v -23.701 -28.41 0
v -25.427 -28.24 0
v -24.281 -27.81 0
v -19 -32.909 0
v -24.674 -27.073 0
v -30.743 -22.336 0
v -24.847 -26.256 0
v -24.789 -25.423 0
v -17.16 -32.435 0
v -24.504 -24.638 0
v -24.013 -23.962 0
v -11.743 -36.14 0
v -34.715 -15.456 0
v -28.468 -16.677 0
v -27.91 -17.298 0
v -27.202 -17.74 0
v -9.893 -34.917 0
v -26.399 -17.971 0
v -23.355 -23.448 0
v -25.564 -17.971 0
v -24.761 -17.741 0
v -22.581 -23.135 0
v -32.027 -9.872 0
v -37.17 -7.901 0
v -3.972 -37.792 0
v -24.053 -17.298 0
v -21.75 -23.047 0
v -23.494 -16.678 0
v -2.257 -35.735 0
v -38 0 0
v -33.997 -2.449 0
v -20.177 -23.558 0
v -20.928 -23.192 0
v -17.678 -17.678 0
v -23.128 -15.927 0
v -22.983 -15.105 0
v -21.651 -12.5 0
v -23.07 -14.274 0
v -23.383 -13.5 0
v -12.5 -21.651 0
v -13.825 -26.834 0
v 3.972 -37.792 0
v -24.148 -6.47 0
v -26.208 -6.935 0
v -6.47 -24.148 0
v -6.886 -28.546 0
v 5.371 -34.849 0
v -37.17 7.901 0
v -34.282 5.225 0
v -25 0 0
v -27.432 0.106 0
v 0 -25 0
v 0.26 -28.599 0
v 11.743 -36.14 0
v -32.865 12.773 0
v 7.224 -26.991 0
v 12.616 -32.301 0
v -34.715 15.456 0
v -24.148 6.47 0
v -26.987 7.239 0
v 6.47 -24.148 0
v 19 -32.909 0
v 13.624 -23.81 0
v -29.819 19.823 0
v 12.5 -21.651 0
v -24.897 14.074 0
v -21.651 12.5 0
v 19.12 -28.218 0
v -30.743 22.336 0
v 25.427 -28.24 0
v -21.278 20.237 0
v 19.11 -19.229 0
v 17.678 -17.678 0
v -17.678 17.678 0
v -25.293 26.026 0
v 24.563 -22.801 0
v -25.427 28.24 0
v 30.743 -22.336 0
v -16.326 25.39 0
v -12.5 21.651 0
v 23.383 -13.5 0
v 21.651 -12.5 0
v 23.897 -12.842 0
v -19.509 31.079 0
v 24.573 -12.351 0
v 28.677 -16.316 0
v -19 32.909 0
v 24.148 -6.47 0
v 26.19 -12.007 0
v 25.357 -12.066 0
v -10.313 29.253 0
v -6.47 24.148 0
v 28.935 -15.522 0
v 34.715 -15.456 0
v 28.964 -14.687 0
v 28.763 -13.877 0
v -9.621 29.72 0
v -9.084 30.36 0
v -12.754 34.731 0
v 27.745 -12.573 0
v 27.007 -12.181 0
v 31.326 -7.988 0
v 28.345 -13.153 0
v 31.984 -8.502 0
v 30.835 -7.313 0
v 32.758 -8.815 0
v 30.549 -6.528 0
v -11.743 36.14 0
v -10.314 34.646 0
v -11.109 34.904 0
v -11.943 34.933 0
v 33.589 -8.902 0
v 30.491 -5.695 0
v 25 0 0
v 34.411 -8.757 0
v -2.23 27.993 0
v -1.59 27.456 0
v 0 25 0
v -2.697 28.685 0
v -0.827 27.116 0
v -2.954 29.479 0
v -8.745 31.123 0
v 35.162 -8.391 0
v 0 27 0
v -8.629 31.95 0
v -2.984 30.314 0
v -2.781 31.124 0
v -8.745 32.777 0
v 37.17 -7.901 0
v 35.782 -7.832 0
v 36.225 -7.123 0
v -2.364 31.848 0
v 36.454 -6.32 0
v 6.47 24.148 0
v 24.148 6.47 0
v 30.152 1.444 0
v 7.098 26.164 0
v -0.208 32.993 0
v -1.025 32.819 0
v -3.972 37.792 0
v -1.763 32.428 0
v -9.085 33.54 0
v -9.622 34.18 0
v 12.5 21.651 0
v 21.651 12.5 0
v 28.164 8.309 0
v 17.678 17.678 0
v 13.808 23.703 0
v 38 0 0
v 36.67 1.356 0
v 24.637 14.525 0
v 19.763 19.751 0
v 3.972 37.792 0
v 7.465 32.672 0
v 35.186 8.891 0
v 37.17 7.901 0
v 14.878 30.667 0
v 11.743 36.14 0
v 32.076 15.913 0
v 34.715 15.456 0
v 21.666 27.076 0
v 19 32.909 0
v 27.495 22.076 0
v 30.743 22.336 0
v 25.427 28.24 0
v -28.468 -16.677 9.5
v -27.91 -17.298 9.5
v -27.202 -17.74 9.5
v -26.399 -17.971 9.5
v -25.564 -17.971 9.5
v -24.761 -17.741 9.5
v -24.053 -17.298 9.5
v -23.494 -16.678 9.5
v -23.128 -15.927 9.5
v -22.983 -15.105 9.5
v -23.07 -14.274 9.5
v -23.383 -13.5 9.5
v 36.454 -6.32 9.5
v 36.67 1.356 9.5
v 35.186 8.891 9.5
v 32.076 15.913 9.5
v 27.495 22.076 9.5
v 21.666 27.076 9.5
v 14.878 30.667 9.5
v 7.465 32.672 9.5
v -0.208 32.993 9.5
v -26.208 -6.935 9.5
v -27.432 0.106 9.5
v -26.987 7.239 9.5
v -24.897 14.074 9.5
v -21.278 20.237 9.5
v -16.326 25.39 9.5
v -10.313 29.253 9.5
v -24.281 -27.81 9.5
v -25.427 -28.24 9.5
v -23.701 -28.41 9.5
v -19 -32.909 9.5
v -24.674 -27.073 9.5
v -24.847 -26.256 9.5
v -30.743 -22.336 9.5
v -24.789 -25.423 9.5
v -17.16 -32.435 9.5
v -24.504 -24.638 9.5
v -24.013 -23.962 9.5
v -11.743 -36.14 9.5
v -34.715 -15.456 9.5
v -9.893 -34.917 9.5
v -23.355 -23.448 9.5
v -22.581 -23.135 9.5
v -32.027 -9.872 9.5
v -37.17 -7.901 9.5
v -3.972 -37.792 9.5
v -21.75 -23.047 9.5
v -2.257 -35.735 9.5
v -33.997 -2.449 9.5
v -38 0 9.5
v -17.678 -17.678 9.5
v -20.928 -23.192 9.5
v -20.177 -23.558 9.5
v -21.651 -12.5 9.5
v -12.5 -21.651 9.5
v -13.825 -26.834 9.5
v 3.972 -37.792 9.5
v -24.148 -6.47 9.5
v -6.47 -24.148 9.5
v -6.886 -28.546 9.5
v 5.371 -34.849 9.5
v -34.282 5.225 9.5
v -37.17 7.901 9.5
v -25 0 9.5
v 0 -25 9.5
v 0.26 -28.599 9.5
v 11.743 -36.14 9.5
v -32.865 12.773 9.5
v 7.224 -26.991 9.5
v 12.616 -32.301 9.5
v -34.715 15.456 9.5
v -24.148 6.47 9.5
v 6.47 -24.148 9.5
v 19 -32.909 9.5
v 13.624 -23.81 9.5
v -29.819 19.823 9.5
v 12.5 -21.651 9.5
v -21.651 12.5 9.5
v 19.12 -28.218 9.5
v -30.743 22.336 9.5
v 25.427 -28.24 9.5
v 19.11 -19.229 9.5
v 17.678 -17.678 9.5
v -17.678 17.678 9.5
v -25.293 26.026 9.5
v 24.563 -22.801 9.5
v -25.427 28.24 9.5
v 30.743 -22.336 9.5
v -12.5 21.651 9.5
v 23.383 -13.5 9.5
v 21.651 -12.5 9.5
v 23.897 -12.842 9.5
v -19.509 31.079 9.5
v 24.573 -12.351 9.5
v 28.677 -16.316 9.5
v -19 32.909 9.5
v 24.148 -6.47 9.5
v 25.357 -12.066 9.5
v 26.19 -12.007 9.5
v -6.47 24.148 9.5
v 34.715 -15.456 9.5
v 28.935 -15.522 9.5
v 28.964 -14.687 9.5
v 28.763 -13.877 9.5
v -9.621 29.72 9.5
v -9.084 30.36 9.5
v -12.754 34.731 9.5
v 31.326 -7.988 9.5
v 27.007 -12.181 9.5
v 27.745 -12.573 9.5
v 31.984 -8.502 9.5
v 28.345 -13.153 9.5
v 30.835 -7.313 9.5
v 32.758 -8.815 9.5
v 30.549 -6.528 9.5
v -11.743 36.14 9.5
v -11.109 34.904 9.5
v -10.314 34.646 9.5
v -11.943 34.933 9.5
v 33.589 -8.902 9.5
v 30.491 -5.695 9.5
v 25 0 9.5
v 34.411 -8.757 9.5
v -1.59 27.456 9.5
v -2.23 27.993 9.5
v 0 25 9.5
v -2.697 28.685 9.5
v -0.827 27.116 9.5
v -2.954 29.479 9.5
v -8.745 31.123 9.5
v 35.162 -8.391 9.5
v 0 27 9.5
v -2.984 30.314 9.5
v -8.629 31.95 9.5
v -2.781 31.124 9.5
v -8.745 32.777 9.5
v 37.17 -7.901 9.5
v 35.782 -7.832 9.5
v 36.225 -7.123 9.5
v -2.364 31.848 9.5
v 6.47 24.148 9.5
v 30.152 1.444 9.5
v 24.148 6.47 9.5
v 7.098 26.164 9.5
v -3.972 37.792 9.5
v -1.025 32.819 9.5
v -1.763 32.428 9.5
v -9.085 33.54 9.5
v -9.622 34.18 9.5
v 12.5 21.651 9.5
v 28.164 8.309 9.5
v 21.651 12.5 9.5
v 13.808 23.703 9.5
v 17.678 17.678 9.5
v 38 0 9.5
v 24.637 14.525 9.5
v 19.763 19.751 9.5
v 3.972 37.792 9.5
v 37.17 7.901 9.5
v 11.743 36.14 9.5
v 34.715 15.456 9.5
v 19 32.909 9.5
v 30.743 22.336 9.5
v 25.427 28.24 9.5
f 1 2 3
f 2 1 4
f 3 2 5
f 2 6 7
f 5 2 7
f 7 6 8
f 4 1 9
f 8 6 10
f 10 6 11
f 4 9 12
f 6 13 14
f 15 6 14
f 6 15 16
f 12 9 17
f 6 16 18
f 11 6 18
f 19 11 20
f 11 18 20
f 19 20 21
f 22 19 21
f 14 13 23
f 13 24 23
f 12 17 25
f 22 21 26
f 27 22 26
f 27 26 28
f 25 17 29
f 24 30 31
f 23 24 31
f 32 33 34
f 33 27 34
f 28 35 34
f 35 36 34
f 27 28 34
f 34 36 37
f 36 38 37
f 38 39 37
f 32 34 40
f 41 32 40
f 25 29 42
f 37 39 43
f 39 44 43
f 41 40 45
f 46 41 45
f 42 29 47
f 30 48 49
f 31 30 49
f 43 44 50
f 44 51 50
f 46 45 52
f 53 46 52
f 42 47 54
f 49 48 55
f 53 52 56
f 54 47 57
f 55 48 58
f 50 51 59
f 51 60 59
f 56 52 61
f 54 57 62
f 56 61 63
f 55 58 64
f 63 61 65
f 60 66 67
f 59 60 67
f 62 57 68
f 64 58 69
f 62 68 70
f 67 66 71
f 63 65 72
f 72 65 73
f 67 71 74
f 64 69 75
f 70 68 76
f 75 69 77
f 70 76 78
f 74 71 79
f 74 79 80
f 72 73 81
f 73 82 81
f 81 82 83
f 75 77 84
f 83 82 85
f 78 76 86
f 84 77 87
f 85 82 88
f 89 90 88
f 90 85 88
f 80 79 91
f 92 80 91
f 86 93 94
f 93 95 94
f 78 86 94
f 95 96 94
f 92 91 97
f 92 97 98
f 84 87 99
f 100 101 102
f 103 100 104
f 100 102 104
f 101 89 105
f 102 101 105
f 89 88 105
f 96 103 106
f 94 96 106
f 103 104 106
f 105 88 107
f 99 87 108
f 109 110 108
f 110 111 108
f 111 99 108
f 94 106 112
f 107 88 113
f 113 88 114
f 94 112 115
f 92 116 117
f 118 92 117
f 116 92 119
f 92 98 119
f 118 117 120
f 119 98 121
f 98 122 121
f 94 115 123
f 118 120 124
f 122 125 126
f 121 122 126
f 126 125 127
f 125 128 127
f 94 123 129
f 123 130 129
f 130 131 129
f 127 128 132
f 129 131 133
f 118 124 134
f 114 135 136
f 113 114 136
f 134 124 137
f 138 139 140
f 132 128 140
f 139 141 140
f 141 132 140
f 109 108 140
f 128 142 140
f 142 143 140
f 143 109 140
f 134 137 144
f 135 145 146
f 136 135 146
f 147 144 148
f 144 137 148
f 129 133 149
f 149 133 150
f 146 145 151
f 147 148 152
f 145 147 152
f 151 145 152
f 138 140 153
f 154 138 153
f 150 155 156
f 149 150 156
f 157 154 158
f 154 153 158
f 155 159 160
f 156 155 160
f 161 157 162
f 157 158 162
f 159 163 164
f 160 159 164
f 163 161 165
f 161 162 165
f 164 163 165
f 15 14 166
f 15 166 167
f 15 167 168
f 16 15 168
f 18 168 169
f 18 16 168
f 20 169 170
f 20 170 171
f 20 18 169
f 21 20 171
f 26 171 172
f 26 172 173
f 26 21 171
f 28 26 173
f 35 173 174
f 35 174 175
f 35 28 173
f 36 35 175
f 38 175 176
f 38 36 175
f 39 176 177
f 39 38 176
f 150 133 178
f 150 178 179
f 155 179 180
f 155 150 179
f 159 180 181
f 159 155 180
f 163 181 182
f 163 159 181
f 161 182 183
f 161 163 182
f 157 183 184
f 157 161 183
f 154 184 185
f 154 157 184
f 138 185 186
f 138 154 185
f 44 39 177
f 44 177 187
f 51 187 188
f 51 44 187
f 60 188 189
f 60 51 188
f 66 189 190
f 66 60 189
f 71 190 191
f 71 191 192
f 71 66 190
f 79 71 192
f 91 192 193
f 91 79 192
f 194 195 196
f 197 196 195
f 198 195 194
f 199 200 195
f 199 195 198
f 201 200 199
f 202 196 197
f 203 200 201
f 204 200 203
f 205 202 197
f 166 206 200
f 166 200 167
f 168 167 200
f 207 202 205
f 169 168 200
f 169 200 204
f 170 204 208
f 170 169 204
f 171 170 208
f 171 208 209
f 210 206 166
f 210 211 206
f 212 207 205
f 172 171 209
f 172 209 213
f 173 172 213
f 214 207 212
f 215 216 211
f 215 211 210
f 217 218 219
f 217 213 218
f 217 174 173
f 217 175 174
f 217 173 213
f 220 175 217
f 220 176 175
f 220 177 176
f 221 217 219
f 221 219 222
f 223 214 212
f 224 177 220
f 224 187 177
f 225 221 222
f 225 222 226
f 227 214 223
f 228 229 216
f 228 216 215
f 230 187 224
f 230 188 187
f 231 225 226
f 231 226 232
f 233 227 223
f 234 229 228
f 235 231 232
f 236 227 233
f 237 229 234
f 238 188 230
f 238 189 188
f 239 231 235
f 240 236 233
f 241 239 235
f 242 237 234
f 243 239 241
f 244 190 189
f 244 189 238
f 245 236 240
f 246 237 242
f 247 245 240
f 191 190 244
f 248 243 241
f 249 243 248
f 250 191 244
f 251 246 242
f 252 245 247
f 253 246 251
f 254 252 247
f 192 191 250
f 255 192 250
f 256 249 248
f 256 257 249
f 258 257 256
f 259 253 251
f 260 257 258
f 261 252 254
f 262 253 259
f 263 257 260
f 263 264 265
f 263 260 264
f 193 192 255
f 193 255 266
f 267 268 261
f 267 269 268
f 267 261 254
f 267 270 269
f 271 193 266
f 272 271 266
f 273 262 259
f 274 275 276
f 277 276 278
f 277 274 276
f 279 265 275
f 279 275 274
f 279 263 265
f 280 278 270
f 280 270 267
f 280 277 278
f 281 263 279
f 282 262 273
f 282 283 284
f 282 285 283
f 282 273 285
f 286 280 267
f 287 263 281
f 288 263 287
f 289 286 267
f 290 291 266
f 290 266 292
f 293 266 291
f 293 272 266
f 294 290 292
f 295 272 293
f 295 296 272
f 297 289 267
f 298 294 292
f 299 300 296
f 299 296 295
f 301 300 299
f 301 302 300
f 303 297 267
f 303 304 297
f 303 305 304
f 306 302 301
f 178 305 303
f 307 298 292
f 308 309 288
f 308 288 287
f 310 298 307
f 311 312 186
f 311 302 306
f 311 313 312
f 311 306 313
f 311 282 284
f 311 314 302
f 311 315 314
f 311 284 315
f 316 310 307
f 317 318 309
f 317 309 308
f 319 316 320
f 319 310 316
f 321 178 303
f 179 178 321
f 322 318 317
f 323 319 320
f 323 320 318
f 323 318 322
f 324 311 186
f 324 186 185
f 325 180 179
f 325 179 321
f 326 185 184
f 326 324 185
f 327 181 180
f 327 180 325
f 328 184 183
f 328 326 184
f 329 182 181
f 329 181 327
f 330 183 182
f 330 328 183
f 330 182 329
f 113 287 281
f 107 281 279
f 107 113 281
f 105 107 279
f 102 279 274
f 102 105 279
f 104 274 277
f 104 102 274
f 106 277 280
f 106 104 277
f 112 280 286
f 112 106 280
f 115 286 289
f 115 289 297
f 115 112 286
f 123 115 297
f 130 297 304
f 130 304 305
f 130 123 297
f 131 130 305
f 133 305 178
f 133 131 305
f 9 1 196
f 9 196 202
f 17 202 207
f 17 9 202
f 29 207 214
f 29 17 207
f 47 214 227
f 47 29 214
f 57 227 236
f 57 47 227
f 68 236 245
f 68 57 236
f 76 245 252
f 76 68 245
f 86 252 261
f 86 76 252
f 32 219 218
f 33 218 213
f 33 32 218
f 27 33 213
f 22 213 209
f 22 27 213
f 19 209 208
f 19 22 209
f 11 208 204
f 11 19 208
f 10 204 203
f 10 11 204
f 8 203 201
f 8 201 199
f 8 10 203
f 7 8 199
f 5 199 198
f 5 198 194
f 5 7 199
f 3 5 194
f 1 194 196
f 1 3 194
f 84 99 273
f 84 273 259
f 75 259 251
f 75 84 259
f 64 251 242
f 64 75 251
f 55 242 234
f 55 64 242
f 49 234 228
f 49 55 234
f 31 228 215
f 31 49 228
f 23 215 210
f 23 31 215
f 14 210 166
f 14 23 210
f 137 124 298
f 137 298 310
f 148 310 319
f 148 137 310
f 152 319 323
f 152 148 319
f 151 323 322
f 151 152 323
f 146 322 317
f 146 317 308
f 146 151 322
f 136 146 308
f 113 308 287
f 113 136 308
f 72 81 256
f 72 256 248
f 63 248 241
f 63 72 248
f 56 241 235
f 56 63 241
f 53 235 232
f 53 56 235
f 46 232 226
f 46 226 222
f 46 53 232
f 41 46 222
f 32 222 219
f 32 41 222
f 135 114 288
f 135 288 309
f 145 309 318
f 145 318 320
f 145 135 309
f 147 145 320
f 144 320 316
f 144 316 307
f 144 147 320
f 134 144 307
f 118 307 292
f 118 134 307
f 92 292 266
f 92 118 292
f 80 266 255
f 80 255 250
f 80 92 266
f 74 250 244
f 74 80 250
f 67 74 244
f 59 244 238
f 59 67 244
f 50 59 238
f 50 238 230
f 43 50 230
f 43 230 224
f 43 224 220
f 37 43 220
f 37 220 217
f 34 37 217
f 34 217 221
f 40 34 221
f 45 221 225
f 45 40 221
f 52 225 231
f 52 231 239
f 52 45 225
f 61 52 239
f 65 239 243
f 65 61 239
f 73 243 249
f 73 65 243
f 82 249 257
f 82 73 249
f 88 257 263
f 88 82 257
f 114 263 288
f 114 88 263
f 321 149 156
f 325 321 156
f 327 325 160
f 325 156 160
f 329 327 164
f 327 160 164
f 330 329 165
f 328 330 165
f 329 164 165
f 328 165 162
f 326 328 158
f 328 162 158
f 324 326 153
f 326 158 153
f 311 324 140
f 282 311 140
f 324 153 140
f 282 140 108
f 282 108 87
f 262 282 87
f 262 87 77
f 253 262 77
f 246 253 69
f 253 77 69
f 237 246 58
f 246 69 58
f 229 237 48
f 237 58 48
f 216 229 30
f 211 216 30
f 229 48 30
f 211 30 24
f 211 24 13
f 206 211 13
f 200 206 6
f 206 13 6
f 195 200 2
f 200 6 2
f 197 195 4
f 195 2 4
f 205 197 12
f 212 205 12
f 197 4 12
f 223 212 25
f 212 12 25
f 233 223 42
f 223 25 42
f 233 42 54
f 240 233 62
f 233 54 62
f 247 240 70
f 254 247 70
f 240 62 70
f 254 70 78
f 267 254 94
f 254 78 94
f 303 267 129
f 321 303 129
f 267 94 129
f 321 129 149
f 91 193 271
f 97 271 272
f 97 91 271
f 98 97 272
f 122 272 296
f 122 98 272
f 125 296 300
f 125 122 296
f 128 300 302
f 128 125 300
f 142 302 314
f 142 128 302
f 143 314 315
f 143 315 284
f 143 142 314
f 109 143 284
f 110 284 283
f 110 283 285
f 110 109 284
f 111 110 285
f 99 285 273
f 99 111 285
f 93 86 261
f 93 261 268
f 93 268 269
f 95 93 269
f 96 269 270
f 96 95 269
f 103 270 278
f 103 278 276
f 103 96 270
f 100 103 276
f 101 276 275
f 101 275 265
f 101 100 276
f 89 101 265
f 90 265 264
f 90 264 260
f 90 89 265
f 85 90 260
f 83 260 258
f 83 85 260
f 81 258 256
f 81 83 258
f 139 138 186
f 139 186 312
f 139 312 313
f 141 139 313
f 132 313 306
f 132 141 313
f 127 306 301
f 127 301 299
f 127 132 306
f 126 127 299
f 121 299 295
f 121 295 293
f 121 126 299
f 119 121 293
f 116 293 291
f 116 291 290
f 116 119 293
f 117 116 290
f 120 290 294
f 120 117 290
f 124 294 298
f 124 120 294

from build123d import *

# Parameters (mm, degrees)
SKETCH2_R           = 38
SKETCH2_R_2         = 25
BOSS_EXTRUDE2_DEPTH = 9.5
CUT_EXTRUDE1_DEPTH  = 9.5
CIRPATTERN1_COUNT   = 3


with BuildPart() as part:
    # Sketch2 → Boss-Extrude2 (new body)
    with BuildSketch(Plane.XY):
        Circle(SKETCH2_R)
        Circle(SKETCH2_R_2, mode=Mode.SUBTRACT)
    extrude(amount=BOSS_EXTRUDE2_DEPTH)

    # Sketch1 → Cut-Extrude1 (cut)
    with BuildSketch(Plane.XY):
        with BuildLine():
            ThreePointArc((-0.208321274, 32.992758301), (-2.998189029, 29.895776448), (0, 27))
            ThreePointArc((0, 27), (22.353121455, 17.28106259), (30.490756455, -5.694983191))
            ThreePointArc((30.490756455, -5.694983191), (33.17056476, -8.887675806), (36.454429797, -6.320403108))
            ThreePointArc((36.454429797, -6.320403108), (27.494508002, 22.075827712), (-0.208321274, 32.992758301))
        make_face()
    cut_extrude1 = extrude(amount=CUT_EXTRUDE1_DEPTH, mode=Mode.SUBTRACT)

    # CirPattern1: Cut-Extrude1 ×3 about axis
    cirpattern1_axis = Axis((0, 0, 9.5), (0, 0, -1))
    for i in range(1, CIRPATTERN1_COUNT):
        add(cut_extrude1.rotate(cirpattern1_axis, i * 360 / CIRPATTERN1_COUNT), mode=Mode.SUBTRACT)


solid = part.part
